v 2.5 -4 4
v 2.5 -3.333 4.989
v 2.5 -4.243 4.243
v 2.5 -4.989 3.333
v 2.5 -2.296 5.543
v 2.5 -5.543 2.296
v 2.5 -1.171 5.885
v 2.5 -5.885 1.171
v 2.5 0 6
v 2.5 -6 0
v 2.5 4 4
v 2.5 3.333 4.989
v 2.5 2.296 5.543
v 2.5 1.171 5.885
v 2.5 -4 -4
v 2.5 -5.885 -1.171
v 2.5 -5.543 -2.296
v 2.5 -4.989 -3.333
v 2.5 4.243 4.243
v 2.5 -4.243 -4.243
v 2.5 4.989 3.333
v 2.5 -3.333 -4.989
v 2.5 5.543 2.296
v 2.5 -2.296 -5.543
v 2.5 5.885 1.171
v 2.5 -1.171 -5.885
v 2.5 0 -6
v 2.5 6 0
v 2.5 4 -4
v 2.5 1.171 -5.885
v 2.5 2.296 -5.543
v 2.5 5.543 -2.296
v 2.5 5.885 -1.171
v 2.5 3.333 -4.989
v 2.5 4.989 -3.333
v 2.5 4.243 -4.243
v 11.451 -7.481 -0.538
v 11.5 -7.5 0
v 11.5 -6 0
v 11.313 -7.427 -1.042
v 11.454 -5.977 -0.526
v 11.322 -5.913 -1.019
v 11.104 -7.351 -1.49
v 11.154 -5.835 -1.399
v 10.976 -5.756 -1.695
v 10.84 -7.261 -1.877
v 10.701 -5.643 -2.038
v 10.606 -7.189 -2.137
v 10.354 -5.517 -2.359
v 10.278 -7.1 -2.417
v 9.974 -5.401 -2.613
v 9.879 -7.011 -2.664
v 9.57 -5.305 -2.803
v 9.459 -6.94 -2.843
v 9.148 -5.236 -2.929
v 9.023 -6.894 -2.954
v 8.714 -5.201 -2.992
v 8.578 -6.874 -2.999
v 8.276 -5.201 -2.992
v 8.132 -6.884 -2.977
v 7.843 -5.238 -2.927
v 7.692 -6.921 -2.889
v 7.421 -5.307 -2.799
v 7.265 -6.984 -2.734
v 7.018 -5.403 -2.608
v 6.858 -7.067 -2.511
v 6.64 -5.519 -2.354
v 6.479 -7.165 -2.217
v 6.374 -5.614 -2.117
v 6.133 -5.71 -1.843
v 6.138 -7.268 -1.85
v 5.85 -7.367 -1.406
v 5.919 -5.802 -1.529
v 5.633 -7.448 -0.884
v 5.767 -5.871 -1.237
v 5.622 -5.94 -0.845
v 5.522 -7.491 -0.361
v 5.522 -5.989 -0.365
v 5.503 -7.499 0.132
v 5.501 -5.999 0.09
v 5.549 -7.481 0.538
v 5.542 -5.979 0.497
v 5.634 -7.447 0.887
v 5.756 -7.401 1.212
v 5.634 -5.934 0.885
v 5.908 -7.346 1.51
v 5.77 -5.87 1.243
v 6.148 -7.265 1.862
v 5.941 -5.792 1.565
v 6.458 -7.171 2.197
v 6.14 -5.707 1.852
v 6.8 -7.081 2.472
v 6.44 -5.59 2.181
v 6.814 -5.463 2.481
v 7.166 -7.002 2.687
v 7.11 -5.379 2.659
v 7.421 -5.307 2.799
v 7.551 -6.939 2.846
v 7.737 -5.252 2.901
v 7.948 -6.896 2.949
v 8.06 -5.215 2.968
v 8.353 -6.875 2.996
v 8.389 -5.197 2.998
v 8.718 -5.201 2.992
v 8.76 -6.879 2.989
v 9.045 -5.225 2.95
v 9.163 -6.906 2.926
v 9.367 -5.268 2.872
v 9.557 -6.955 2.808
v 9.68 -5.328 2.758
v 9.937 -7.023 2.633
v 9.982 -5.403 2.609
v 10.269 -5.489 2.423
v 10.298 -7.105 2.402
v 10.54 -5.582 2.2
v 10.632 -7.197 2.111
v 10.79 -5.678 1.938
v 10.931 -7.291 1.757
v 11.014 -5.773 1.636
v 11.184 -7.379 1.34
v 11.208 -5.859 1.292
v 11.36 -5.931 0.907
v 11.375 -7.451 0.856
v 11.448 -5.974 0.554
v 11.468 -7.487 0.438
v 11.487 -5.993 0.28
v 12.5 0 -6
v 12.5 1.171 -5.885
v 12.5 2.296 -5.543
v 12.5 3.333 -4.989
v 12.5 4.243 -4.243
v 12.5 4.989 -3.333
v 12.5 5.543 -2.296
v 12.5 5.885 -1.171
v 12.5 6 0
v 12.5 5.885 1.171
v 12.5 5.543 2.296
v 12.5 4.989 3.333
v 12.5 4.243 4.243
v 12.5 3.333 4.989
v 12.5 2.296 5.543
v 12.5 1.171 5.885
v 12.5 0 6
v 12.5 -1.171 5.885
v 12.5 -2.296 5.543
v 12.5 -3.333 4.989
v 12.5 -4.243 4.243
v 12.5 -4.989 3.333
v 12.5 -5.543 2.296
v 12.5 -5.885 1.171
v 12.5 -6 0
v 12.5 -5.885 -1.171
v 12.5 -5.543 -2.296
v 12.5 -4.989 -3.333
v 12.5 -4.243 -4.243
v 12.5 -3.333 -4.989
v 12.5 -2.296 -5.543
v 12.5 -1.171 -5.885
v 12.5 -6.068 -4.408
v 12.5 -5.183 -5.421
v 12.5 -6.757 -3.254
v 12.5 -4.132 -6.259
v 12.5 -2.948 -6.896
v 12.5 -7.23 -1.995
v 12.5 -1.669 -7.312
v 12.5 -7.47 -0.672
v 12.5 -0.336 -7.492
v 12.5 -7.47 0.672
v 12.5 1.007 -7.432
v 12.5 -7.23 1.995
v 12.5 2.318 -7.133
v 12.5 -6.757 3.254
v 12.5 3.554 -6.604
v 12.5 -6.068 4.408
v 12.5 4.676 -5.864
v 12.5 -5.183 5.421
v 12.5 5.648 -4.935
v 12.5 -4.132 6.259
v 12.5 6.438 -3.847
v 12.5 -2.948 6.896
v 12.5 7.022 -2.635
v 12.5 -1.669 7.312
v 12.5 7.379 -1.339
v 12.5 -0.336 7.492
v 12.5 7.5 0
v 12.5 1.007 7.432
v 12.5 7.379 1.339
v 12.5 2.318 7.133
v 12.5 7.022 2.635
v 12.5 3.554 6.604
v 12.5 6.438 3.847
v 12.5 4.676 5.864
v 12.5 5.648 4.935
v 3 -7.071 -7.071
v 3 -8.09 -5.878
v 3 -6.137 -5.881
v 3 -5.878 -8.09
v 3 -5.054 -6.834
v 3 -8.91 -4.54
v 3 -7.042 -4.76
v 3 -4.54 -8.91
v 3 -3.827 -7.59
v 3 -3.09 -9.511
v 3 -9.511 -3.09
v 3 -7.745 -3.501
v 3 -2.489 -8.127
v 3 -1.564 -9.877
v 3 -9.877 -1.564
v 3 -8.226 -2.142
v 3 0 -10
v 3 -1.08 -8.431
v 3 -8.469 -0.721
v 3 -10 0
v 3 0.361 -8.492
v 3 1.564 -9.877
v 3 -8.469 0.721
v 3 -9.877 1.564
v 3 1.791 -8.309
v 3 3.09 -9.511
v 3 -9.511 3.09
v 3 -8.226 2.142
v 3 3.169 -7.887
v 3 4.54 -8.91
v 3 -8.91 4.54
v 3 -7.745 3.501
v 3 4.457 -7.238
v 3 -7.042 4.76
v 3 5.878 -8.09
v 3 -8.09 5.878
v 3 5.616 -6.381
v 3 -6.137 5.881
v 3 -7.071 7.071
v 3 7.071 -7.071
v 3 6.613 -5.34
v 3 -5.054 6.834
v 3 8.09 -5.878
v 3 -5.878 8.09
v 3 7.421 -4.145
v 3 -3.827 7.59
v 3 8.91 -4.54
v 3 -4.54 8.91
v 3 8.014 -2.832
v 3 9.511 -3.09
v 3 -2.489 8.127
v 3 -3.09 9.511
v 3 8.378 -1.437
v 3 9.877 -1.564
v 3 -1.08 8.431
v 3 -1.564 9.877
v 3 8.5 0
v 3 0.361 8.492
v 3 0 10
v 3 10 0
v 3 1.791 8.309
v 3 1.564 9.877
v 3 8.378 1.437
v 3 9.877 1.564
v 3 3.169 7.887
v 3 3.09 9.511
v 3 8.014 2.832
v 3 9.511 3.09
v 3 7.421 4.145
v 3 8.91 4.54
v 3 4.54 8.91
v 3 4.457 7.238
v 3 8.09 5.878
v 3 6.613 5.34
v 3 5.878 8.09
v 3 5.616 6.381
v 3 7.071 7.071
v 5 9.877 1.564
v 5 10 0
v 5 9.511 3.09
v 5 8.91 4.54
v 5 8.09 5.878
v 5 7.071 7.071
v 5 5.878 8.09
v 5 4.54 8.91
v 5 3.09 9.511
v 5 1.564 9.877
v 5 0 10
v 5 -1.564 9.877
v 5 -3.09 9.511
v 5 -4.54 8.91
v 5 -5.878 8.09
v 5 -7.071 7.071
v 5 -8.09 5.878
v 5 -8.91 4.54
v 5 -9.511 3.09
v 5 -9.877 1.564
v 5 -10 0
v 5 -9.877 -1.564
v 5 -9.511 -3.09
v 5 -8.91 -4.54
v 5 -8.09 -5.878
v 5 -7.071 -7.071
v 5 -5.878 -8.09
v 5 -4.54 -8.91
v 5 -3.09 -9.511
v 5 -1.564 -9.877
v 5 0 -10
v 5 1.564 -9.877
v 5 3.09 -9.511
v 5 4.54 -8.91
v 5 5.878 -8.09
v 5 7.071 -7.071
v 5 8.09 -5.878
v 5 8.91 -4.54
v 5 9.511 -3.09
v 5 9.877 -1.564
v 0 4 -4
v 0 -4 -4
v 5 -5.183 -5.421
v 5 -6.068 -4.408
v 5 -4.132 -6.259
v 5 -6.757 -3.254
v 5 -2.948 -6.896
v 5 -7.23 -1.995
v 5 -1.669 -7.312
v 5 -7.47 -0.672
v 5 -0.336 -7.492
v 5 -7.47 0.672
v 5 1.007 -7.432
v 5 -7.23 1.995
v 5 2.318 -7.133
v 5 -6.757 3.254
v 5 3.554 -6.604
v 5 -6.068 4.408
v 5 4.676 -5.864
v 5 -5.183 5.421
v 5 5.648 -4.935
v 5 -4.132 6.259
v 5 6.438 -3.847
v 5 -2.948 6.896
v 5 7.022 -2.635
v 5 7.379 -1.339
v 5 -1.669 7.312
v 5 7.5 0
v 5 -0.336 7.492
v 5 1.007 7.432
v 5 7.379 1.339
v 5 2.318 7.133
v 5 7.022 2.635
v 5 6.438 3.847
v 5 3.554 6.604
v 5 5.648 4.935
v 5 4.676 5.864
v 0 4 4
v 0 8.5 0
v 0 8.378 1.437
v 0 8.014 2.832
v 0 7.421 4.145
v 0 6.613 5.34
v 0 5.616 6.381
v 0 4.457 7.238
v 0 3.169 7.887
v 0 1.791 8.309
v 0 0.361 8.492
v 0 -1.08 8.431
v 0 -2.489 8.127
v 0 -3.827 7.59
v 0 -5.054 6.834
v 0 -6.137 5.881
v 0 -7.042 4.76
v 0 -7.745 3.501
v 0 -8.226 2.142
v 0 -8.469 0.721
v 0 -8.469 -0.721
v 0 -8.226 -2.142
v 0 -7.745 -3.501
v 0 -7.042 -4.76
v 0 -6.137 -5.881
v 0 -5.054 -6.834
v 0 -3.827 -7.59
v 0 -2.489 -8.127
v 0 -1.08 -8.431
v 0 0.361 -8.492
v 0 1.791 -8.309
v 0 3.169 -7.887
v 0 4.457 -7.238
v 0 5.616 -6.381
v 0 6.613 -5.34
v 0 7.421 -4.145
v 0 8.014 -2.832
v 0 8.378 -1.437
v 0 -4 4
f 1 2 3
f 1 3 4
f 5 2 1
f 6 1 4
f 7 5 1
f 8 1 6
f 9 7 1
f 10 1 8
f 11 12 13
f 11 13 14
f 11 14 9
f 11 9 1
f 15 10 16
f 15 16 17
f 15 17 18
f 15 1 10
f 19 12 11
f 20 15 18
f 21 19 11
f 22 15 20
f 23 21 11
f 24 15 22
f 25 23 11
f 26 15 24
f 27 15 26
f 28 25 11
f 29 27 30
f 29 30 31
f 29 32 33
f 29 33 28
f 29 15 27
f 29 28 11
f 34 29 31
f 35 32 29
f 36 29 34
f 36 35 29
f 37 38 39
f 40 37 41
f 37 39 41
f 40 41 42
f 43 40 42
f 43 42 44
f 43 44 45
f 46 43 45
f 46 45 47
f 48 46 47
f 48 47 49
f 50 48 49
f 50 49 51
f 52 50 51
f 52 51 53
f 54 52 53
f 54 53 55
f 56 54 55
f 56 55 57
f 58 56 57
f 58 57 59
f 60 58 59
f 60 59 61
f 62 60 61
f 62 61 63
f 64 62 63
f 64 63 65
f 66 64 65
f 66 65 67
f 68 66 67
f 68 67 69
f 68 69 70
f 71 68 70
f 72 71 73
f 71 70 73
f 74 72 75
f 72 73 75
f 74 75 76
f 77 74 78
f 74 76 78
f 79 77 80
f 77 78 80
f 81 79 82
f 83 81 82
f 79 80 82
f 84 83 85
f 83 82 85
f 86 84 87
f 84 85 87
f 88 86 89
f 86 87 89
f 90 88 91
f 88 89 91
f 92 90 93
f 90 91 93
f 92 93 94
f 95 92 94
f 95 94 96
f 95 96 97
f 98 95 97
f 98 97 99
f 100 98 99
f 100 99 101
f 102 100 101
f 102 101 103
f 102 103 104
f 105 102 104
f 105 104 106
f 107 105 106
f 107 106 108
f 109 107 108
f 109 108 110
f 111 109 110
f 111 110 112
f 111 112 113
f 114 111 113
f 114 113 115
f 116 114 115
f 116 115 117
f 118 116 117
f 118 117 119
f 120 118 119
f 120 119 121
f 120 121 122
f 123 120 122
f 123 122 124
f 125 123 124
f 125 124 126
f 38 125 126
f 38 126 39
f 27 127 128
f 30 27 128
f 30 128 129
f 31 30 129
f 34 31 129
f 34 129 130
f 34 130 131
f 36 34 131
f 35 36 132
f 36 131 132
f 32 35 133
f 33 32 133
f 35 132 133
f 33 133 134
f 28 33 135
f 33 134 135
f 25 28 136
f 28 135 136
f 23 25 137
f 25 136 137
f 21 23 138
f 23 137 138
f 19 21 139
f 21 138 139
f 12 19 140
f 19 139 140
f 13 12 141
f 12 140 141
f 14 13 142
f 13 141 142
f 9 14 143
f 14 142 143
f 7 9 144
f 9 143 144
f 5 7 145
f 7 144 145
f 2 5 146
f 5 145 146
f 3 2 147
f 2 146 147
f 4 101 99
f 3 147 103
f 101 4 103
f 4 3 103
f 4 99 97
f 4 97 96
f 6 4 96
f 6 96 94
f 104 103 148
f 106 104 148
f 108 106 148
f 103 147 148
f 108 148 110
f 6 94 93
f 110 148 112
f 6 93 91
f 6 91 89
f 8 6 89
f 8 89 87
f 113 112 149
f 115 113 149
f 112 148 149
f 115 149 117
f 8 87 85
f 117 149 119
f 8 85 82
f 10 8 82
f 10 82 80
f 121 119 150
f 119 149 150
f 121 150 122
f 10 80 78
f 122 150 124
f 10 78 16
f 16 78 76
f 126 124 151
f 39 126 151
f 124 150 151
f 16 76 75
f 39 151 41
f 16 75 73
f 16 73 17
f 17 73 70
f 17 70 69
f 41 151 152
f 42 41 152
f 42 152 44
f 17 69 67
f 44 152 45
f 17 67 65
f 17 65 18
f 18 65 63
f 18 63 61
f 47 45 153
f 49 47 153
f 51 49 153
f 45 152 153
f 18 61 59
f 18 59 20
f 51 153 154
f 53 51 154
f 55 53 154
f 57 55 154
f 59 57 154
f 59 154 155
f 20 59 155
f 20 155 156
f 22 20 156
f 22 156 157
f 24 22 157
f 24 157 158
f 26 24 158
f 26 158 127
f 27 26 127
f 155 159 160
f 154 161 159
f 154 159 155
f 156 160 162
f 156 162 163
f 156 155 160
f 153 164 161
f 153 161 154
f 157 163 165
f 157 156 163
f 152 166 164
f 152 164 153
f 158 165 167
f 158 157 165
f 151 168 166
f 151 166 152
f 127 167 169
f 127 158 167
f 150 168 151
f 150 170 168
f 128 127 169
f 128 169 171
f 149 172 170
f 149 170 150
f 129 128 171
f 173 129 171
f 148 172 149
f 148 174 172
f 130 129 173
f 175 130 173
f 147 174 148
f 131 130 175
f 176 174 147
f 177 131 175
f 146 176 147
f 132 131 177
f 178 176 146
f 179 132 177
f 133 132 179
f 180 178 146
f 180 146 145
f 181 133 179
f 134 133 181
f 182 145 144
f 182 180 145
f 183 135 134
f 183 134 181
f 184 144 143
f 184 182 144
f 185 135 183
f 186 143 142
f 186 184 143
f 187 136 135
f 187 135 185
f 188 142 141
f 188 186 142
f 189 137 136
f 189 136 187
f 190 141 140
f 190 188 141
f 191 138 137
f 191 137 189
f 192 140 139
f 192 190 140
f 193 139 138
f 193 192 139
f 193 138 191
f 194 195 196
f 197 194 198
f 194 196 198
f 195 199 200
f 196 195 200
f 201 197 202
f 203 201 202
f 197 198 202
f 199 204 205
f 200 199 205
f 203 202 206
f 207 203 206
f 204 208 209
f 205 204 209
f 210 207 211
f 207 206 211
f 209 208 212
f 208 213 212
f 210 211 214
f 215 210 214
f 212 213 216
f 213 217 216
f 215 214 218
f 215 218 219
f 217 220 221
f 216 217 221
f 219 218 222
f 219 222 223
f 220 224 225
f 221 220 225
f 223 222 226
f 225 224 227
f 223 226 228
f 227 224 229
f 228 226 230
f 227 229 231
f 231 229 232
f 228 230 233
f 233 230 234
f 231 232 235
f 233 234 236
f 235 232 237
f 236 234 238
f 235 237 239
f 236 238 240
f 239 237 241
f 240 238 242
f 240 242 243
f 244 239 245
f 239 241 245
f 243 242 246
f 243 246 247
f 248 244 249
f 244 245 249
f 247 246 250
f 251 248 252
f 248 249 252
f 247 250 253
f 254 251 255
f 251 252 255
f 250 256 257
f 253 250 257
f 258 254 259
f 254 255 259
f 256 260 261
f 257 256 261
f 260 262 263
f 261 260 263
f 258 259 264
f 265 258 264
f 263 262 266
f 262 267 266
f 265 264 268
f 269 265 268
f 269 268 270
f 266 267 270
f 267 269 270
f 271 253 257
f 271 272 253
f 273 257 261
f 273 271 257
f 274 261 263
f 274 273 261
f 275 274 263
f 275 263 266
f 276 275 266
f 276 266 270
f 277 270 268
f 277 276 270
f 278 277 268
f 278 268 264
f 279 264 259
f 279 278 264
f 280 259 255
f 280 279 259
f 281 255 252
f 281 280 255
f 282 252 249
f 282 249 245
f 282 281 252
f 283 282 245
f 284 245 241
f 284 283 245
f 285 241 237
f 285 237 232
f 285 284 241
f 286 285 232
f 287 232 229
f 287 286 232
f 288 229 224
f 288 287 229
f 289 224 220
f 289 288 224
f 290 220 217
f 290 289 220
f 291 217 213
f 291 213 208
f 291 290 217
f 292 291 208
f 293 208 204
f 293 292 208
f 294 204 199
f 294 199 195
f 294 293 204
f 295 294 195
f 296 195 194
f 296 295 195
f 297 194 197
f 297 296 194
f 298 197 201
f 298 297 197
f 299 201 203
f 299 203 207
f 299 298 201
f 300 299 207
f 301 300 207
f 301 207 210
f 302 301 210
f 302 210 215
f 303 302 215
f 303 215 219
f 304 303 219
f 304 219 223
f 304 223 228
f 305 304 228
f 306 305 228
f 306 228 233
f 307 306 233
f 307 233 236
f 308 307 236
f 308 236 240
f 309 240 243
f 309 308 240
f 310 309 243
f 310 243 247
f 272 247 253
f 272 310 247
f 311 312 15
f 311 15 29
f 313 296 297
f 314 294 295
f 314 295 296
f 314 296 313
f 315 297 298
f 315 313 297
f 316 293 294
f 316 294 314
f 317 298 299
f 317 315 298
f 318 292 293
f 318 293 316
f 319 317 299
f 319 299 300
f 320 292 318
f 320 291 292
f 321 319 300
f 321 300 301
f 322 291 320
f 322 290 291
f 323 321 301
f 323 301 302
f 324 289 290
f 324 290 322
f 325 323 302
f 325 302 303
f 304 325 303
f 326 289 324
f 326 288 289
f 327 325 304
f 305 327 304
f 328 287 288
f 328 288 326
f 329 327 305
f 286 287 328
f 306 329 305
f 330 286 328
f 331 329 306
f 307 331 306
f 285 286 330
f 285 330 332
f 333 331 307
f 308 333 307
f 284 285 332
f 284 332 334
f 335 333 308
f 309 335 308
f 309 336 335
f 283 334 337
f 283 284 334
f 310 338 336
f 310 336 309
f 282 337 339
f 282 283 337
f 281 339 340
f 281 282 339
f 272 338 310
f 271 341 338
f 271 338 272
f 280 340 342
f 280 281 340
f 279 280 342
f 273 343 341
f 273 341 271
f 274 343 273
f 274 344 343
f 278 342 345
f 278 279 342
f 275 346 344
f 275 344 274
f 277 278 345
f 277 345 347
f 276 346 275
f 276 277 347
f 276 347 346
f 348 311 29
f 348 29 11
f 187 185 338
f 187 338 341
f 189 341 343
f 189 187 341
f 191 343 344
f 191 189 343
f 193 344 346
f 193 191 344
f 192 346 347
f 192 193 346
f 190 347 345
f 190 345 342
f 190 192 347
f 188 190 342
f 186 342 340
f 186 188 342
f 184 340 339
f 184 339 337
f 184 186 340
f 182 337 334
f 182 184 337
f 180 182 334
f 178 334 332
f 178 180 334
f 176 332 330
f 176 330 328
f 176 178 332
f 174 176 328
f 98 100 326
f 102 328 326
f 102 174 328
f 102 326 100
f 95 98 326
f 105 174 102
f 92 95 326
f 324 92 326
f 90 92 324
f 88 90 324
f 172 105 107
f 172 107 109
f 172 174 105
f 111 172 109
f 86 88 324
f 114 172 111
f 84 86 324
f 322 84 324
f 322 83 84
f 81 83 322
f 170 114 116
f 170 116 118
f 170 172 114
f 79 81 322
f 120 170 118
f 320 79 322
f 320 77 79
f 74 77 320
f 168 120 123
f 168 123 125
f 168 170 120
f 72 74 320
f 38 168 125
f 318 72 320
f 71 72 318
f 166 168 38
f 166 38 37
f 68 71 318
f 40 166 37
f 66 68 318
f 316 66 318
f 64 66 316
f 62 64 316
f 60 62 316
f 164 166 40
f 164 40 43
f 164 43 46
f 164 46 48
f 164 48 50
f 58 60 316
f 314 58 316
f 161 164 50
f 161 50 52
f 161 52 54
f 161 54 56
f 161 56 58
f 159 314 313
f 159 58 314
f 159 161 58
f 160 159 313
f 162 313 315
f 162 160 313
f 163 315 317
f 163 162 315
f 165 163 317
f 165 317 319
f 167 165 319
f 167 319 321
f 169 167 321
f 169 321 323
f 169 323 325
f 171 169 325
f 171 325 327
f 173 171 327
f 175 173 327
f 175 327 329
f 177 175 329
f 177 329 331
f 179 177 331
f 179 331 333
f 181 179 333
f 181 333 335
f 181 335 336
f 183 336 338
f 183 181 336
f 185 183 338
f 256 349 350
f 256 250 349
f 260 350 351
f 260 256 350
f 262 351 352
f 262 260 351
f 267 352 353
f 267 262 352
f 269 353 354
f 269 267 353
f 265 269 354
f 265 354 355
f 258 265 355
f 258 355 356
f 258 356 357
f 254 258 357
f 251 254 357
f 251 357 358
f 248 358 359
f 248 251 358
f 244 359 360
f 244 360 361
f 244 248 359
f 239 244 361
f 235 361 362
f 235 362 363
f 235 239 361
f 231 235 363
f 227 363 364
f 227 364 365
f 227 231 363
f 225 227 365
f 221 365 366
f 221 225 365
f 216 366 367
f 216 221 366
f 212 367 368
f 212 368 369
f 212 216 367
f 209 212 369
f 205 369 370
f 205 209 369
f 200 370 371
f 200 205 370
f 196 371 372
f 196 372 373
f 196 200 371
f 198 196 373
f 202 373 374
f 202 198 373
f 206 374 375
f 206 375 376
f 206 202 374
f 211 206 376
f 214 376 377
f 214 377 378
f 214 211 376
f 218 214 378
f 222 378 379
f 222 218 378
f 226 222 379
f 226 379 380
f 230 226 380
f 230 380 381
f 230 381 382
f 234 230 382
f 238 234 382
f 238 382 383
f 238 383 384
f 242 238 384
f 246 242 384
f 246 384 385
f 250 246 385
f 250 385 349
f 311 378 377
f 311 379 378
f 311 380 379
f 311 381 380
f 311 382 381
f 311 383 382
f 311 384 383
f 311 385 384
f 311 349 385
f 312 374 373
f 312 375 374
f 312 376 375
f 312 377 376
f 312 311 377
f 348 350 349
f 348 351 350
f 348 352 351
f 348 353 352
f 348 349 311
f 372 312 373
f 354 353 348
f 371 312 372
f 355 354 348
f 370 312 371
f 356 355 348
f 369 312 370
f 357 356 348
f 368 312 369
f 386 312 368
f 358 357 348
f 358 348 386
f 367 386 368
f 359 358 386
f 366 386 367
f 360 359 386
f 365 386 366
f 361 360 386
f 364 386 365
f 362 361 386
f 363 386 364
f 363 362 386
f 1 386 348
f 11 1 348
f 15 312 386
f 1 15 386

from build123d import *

# Parameters (mm, degrees)
ESQUISSE2_W             = 8
ESQUISSE2_H             = 8
ENL_V_MAT_EXTRU_1_DEPTH = 13.5
ESQUISSE3_R             = 6
ENL_V_MAT_EXTRU_2_DEPTH = 10
ESQUISSE4_R             = 3
ENL_V_MAT_EXTRU_3_DEPTH = 10


with BuildPart() as part:
    # Esquisse1 → Révolution1 (revolve)
    with BuildSketch(Plane.XY):
        Polygon((0, 0), (0, 8.5), (3, 8.5), (3, 9.093663992), (3, 10), (5, 10), (5, 7.5), (12.5, 7.5), (12.5, 0), align=None)
    revolve(axis=Axis((-59.603539616, 0, 0), (1, 0, 0)))

    # Esquisse2 → Enlèv. mat.-Extru.1 (cut, through all)
    with BuildSketch(Plane.ZY):
        Rectangle(ESQUISSE2_W, ESQUISSE2_H)
    extrude(amount=-ENL_V_MAT_EXTRU_1_DEPTH, mode=Mode.SUBTRACT)

    # Esquisse3 → Enlèv. mat.-Extru.2 (cut)
    with BuildSketch(Plane(origin=(12.5, 0, 0), x_dir=(0, 0, -1), z_dir=(1, 0, 0))):
        Circle(ESQUISSE3_R)
    extrude(amount=-ENL_V_MAT_EXTRU_2_DEPTH, mode=Mode.SUBTRACT)

    # Esquisse4 → Enlèv. mat.-Extru.3 (cut)
    with BuildSketch(Plane(origin=(0, 0, 0), x_dir=(1, 0, 0), z_dir=(0, 1, 0))):
        with Locations((8.5, 0)):
            Circle(ESQUISSE4_R)
    extrude(amount=-ENL_V_MAT_EXTRU_3_DEPTH, mode=Mode.SUBTRACT)


solid = part.part
